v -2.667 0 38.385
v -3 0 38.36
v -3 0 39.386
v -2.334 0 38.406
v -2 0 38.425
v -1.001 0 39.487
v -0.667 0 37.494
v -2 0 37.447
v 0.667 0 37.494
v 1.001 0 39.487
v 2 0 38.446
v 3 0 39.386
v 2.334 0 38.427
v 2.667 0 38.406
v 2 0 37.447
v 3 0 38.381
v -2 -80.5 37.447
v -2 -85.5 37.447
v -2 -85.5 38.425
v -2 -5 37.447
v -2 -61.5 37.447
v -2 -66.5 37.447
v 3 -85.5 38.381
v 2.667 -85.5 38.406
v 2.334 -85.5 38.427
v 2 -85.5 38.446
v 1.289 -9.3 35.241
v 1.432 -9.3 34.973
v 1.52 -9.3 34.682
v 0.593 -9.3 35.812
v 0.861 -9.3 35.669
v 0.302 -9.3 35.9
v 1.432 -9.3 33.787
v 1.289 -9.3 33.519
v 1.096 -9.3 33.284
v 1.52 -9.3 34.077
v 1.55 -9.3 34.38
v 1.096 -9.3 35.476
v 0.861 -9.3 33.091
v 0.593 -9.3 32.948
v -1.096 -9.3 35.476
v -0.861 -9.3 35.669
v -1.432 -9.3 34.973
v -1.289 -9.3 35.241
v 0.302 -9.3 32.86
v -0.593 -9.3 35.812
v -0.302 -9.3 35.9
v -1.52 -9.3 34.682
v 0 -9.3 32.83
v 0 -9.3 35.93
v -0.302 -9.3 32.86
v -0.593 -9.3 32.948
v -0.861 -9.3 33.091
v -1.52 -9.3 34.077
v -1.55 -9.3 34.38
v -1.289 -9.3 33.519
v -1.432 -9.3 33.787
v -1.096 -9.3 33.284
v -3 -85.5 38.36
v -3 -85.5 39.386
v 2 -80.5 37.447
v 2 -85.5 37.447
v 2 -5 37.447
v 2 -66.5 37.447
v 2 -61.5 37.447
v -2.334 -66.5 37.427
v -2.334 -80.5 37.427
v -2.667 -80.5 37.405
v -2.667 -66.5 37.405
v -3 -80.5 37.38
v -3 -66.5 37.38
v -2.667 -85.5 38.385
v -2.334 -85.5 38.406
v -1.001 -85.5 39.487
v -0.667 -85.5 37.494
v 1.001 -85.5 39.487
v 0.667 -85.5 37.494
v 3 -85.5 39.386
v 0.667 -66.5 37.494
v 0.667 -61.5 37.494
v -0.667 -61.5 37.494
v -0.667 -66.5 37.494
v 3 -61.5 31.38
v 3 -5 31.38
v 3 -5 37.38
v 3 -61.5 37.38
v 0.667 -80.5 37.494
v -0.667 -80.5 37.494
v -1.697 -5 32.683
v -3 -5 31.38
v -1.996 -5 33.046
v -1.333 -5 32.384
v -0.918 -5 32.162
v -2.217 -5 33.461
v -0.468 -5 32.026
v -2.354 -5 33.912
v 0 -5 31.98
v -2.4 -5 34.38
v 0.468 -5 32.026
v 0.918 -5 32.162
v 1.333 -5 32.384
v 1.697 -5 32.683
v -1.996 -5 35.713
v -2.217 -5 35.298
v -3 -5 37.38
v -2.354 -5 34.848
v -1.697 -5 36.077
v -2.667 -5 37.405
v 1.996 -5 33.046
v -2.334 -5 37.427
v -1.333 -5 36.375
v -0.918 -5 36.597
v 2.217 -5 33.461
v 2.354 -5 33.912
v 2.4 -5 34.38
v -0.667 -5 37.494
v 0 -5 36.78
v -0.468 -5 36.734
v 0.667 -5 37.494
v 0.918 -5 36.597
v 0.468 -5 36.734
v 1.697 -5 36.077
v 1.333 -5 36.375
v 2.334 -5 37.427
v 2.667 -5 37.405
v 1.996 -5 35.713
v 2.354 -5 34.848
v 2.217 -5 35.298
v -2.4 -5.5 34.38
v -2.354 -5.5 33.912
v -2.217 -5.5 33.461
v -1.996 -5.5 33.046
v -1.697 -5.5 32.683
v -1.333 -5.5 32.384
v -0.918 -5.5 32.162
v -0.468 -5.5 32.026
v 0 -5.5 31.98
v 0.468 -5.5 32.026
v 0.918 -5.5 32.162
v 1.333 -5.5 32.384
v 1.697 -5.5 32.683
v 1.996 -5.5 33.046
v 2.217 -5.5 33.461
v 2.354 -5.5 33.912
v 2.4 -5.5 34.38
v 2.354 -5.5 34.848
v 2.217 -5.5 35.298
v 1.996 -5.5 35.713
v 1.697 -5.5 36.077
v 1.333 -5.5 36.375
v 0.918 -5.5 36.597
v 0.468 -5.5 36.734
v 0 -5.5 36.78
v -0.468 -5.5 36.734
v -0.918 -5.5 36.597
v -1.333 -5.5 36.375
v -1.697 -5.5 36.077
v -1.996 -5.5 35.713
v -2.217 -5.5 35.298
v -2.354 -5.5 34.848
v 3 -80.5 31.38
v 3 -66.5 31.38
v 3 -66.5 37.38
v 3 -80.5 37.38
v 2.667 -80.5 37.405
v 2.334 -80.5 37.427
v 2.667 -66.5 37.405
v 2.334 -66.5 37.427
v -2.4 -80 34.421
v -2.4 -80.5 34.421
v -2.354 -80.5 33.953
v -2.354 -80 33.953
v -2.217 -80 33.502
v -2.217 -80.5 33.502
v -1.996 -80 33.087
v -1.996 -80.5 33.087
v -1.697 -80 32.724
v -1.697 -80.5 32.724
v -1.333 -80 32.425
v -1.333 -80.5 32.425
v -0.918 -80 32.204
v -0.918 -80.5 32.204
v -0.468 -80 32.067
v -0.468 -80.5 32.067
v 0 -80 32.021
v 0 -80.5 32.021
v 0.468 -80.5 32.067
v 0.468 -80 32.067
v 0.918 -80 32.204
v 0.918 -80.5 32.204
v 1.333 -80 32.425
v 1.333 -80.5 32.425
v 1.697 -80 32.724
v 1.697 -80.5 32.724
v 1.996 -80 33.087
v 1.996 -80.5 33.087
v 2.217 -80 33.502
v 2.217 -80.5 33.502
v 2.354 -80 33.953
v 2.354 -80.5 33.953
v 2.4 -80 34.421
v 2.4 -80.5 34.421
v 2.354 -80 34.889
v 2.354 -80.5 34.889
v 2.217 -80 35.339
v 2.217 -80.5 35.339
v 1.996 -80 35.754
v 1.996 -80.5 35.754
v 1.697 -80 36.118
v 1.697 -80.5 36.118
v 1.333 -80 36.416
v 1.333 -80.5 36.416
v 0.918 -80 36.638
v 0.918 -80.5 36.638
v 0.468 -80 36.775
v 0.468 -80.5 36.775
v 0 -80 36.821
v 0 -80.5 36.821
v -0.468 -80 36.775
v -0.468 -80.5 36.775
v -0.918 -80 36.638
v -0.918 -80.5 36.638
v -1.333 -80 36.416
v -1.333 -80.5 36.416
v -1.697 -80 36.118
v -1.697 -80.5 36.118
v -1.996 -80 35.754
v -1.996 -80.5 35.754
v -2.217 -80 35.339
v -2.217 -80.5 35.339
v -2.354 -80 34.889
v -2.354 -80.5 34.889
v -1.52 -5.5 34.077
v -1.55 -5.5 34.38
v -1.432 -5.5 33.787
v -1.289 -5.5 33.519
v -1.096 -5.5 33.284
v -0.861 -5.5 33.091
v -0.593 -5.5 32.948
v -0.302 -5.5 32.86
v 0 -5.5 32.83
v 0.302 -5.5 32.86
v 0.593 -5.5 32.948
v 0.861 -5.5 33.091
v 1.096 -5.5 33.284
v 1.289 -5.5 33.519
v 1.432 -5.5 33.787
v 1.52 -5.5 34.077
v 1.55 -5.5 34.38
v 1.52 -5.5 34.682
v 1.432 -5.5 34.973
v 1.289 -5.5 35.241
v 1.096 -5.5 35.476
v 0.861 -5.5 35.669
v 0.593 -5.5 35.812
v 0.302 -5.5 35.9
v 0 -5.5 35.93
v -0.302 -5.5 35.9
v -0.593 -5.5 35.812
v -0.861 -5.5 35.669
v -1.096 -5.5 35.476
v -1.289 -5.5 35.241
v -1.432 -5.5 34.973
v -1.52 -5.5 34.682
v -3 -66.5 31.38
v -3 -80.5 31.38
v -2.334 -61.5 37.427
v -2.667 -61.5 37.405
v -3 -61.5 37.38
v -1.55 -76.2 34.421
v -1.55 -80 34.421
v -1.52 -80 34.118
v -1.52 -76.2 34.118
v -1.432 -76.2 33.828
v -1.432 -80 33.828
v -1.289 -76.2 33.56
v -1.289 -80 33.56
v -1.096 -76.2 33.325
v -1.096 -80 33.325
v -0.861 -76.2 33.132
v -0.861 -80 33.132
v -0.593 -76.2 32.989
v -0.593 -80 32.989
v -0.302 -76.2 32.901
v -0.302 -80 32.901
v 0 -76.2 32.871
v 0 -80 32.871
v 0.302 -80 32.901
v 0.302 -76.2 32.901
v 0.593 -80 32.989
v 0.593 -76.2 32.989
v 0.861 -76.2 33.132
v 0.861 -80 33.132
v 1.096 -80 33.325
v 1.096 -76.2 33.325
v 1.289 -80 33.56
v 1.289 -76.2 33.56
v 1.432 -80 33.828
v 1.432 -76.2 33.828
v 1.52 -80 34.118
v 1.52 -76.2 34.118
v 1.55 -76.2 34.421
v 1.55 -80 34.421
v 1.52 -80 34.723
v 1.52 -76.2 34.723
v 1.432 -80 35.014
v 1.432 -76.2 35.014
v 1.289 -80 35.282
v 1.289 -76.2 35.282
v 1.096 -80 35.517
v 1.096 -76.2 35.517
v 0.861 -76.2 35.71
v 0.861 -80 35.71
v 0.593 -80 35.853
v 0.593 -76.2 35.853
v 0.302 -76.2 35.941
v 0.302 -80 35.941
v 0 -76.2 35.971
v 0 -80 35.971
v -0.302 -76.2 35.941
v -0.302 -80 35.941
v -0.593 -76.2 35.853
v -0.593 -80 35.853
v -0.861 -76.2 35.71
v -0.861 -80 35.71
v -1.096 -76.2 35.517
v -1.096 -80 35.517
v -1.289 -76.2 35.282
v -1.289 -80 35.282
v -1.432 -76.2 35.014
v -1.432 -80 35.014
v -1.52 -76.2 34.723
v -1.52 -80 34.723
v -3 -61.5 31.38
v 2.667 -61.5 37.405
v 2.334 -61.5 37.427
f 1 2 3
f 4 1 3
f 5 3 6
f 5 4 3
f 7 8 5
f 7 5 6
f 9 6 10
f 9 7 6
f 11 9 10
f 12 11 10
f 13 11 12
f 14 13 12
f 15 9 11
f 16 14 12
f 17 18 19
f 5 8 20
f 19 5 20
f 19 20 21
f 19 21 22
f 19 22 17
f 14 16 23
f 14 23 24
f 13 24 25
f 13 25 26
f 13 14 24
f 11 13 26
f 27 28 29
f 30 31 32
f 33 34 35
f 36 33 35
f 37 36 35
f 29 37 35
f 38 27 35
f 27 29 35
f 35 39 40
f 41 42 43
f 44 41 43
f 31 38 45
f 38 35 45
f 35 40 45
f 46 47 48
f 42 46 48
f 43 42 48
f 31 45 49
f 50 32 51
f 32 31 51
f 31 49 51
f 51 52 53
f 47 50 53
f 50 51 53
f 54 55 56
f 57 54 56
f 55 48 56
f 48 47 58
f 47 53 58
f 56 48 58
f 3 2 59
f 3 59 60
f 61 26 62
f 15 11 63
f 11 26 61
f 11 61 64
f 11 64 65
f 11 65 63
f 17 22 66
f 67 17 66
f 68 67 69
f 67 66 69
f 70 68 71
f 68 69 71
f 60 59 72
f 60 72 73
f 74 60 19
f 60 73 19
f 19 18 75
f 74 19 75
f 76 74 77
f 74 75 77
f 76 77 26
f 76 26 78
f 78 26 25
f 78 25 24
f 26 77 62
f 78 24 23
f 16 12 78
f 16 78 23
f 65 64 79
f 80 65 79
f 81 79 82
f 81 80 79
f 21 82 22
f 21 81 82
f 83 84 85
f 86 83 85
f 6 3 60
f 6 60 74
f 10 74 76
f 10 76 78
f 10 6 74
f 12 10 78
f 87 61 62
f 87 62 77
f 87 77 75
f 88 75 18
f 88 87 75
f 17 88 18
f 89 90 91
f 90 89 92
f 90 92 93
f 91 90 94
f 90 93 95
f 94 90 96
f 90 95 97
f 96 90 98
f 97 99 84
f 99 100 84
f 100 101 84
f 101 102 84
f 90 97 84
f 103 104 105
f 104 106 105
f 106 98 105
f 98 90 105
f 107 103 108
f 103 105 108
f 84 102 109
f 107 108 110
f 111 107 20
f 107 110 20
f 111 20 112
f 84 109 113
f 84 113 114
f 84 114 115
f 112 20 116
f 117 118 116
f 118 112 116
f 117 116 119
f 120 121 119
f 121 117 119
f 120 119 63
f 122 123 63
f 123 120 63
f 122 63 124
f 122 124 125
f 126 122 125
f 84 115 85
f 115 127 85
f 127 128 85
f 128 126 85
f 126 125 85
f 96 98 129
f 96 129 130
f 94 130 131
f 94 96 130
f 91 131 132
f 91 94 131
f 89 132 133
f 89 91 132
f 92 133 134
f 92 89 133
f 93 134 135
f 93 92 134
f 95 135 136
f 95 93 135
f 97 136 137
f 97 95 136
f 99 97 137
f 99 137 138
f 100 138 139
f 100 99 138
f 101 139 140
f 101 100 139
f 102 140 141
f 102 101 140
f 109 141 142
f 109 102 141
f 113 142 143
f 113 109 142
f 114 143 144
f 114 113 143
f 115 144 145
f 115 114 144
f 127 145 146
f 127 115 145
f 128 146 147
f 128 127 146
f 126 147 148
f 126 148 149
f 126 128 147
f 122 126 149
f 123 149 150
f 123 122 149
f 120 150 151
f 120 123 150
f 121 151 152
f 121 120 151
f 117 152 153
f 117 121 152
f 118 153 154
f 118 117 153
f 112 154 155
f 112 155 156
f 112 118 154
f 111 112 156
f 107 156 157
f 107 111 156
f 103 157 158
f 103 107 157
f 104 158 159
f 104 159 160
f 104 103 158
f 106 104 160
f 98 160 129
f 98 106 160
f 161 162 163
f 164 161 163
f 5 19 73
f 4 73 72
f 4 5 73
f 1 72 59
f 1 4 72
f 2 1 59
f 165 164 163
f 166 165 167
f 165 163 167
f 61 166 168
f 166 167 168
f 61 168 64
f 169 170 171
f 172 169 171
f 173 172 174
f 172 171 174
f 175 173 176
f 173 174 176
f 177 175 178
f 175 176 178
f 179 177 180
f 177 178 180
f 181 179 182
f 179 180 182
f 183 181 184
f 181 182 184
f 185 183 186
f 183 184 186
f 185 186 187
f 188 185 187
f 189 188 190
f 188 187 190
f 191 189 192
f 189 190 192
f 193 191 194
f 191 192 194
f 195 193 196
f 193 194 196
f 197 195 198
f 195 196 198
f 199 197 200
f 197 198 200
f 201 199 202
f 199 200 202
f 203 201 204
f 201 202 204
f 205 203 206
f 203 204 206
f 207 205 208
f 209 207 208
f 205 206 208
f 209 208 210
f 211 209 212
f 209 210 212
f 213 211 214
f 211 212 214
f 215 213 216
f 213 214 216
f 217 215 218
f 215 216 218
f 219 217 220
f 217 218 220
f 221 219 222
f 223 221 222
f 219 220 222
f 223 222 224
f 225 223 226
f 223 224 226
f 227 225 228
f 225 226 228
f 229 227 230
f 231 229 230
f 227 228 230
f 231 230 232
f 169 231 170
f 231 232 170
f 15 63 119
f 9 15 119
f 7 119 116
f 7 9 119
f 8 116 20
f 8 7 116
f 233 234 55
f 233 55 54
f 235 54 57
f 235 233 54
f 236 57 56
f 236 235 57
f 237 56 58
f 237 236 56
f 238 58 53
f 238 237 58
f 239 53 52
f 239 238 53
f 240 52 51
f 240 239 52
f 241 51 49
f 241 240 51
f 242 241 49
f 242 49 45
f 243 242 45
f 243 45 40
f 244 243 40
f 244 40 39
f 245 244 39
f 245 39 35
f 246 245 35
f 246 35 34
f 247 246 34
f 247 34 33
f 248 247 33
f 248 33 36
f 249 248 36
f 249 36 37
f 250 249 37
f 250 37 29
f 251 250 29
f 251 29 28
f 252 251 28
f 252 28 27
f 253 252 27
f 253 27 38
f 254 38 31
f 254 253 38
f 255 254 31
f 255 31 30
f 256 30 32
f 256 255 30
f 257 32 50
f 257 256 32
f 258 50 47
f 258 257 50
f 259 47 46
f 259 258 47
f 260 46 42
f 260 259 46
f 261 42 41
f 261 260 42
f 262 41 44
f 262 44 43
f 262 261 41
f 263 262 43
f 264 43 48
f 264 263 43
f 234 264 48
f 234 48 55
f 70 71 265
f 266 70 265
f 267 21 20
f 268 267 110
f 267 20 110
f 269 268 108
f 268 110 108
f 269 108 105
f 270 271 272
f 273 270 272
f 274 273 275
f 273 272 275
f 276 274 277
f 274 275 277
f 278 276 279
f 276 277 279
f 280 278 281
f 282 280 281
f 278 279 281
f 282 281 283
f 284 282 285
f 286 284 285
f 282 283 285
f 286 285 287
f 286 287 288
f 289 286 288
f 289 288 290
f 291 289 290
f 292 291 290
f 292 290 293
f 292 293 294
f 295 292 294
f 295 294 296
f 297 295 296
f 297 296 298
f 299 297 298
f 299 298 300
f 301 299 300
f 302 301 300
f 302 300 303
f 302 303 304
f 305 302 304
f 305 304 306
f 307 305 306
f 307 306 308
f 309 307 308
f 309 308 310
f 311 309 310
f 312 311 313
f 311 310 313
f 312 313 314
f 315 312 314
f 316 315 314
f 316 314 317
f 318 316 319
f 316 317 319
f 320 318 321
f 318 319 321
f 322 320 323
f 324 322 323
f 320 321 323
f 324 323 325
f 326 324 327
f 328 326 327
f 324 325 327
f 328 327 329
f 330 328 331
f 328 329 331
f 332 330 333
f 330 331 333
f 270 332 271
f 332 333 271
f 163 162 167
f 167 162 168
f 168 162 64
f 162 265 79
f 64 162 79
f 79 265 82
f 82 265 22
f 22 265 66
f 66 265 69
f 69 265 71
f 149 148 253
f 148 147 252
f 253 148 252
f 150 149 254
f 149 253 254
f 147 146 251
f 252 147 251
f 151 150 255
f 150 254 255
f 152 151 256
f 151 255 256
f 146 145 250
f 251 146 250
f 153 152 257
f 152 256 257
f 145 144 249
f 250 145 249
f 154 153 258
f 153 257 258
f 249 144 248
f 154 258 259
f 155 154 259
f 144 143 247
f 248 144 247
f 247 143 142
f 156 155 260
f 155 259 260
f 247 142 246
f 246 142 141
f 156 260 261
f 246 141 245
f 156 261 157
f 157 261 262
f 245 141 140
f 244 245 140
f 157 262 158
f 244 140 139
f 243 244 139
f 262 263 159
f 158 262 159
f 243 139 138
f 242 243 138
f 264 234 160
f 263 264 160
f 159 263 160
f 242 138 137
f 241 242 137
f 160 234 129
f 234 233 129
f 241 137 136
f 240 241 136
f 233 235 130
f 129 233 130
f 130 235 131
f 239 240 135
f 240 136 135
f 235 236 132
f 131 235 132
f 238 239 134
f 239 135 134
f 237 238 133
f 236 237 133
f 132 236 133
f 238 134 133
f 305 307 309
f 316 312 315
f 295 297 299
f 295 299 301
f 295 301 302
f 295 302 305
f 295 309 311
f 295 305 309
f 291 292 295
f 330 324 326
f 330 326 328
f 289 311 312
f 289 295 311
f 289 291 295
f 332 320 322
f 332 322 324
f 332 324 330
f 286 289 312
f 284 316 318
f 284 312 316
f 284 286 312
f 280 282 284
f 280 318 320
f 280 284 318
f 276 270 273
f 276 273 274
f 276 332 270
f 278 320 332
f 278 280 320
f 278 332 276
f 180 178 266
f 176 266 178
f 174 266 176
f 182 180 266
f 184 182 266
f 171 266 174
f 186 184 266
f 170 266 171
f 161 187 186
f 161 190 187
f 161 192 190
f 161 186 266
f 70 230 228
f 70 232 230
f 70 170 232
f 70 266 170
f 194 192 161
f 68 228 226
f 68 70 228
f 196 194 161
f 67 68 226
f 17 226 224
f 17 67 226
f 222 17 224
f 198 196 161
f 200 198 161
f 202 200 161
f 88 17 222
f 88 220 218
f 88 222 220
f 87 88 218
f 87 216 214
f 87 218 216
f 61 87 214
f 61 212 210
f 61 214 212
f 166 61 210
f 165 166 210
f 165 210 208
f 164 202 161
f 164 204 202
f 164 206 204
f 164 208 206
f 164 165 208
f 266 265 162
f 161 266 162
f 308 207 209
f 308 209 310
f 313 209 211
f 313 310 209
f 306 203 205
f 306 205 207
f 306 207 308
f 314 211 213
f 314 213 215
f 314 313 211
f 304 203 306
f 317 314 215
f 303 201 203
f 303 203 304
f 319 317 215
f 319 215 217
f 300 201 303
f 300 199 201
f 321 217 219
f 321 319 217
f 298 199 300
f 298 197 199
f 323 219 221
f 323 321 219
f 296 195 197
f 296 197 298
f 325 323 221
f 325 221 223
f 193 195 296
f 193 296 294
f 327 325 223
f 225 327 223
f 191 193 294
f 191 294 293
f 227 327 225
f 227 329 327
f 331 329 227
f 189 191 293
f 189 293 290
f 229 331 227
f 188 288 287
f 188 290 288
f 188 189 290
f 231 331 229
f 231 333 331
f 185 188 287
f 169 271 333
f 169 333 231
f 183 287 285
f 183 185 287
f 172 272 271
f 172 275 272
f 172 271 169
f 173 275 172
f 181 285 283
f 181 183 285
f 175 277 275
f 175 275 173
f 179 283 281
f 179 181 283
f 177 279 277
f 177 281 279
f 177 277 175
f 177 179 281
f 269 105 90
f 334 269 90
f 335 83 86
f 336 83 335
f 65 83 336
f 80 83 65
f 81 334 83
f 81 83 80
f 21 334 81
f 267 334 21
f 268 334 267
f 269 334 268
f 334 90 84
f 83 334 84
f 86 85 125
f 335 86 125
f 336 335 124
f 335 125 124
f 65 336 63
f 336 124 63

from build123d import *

# Parameters (mm, degrees)
BOSS_EXTRUDE2_DEPTH = 75.5
BOSS_EXTRUDE3_DEPTH = 85.5
SKETCH7_W           = 37.5
SKETCH7_H           = 5
SKETCH9_R           = 1.55
CUT_EXTRUDE4_DEPTH  = 4.3
SKETCH10_R          = 2.4
CUT_EXTRUDE5_DEPTH  = 0.5
SKETCH13_R          = 2.4
CUT_EXTRUDE6_DEPTH  = 0.5
SKETCH14_R          = 1.55
CUT_EXTRUDE7_DEPTH  = 4.3


with BuildPart() as part:
    # Sketch3 → Boss-Extrude2 (new body)
    with BuildSketch(Plane.XZ.offset(5)):
        with BuildLine():
            Line((-3, 37.379807383), (-3, 31.379807383))
            Line((-3, 31.379807383), (3, 31.379807383))
            Line((3, 31.379807383), (3, 37.379807383))
            ThreePointArc((3, 37.379807383), (0, 37.5), (-3, 37.379807383))
        make_face()
    extrude(amount=BOSS_EXTRUDE2_DEPTH)

    # Sketch5 → Boss-Extrude3 (add)
    with BuildSketch(Plane(origin=(0, 0, 0), x_dir=(1, 0, 0), z_dir=(0, 1, 0))):
        with BuildLine():
            Line((-2.99999884, -38.360165319), (-2.99999884, -39.385911275))
            ThreePointArc((-2.99999884, -39.385911275), (1.163e-06, -39.5), (3.00000116, -39.385911098))
            Line((3.00000116, -39.385911098), (3.00000116, -38.381035126))
            ThreePointArc((3.00000116, -38.381035126), (2.500212929, -38.41682964), (2.00000116, -38.446116314))
            Line((2.00000116, -38.446116314), (2.00000116, -37.446628625))
            ThreePointArc((2.00000116, -37.446628625), (0, -37.5), (-2.00000116, -37.446628625))
            Line((-2.00000116, -37.446628625), (-2.00000116, -38.425281674))
            ThreePointArc((-2.00000116, -38.425281674), (-2.500211998, -38.395979168), (-2.99999884, -38.360165319))
        make_face()
    extrude(amount=-BOSS_EXTRUDE3_DEPTH)

    # Sketch7 → Cut-Revolve1 (revolve, cut)
    with BuildSketch(Plane(origin=(0, 0, 0), x_dir=(0, 0, -1), z_dir=(1, 0, 0))):
        with Locations((-18.75, -64)):
            Rectangle(SKETCH7_W, SKETCH7_H)
    revolve(axis=Axis((0, -27.016689378, 0), (0, -1, 0)), mode=Mode.SUBTRACT)

    # Sketch9 → Cut-Extrude4 (cut)
    with BuildSketch(Plane(origin=(0, -80.5, 0), x_dir=(-1, 0, 0), z_dir=(0, -1, 0))):
        with Locations((0, -34.420864201)):
            Circle(SKETCH9_R)
    extrude(amount=-CUT_EXTRUDE4_DEPTH, mode=Mode.SUBTRACT)

    # Sketch10 → Cut-Extrude5 (cut)
    with BuildSketch(Plane(origin=(0, -80.5, 0), x_dir=(-1, 0, 0), z_dir=(0, -1, 0))):
        with Locations((0, -34.420864201)):
            Circle(SKETCH10_R)
    extrude(amount=-CUT_EXTRUDE5_DEPTH, mode=Mode.SUBTRACT)

    # Sketch13 → Cut-Extrude6 (cut)
    with BuildSketch(Plane(origin=(0, -5, 0), x_dir=(-1, 0, 0), z_dir=(0, -1, 0))):
        with Locations((0, -34.379807383)):
            Circle(SKETCH13_R)
    extrude(amount=CUT_EXTRUDE6_DEPTH, mode=Mode.SUBTRACT)

    # Sketch14 → Cut-Extrude7 (cut)
    with BuildSketch(Plane(origin=(0, -5, 0), x_dir=(-1, 0, 0), z_dir=(0, -1, 0))):
        with Locations((0, -34.379807383)):
            Circle(SKETCH14_R)
    extrude(amount=CUT_EXTRUDE7_DEPTH, mode=Mode.SUBTRACT)


solid = part.part
